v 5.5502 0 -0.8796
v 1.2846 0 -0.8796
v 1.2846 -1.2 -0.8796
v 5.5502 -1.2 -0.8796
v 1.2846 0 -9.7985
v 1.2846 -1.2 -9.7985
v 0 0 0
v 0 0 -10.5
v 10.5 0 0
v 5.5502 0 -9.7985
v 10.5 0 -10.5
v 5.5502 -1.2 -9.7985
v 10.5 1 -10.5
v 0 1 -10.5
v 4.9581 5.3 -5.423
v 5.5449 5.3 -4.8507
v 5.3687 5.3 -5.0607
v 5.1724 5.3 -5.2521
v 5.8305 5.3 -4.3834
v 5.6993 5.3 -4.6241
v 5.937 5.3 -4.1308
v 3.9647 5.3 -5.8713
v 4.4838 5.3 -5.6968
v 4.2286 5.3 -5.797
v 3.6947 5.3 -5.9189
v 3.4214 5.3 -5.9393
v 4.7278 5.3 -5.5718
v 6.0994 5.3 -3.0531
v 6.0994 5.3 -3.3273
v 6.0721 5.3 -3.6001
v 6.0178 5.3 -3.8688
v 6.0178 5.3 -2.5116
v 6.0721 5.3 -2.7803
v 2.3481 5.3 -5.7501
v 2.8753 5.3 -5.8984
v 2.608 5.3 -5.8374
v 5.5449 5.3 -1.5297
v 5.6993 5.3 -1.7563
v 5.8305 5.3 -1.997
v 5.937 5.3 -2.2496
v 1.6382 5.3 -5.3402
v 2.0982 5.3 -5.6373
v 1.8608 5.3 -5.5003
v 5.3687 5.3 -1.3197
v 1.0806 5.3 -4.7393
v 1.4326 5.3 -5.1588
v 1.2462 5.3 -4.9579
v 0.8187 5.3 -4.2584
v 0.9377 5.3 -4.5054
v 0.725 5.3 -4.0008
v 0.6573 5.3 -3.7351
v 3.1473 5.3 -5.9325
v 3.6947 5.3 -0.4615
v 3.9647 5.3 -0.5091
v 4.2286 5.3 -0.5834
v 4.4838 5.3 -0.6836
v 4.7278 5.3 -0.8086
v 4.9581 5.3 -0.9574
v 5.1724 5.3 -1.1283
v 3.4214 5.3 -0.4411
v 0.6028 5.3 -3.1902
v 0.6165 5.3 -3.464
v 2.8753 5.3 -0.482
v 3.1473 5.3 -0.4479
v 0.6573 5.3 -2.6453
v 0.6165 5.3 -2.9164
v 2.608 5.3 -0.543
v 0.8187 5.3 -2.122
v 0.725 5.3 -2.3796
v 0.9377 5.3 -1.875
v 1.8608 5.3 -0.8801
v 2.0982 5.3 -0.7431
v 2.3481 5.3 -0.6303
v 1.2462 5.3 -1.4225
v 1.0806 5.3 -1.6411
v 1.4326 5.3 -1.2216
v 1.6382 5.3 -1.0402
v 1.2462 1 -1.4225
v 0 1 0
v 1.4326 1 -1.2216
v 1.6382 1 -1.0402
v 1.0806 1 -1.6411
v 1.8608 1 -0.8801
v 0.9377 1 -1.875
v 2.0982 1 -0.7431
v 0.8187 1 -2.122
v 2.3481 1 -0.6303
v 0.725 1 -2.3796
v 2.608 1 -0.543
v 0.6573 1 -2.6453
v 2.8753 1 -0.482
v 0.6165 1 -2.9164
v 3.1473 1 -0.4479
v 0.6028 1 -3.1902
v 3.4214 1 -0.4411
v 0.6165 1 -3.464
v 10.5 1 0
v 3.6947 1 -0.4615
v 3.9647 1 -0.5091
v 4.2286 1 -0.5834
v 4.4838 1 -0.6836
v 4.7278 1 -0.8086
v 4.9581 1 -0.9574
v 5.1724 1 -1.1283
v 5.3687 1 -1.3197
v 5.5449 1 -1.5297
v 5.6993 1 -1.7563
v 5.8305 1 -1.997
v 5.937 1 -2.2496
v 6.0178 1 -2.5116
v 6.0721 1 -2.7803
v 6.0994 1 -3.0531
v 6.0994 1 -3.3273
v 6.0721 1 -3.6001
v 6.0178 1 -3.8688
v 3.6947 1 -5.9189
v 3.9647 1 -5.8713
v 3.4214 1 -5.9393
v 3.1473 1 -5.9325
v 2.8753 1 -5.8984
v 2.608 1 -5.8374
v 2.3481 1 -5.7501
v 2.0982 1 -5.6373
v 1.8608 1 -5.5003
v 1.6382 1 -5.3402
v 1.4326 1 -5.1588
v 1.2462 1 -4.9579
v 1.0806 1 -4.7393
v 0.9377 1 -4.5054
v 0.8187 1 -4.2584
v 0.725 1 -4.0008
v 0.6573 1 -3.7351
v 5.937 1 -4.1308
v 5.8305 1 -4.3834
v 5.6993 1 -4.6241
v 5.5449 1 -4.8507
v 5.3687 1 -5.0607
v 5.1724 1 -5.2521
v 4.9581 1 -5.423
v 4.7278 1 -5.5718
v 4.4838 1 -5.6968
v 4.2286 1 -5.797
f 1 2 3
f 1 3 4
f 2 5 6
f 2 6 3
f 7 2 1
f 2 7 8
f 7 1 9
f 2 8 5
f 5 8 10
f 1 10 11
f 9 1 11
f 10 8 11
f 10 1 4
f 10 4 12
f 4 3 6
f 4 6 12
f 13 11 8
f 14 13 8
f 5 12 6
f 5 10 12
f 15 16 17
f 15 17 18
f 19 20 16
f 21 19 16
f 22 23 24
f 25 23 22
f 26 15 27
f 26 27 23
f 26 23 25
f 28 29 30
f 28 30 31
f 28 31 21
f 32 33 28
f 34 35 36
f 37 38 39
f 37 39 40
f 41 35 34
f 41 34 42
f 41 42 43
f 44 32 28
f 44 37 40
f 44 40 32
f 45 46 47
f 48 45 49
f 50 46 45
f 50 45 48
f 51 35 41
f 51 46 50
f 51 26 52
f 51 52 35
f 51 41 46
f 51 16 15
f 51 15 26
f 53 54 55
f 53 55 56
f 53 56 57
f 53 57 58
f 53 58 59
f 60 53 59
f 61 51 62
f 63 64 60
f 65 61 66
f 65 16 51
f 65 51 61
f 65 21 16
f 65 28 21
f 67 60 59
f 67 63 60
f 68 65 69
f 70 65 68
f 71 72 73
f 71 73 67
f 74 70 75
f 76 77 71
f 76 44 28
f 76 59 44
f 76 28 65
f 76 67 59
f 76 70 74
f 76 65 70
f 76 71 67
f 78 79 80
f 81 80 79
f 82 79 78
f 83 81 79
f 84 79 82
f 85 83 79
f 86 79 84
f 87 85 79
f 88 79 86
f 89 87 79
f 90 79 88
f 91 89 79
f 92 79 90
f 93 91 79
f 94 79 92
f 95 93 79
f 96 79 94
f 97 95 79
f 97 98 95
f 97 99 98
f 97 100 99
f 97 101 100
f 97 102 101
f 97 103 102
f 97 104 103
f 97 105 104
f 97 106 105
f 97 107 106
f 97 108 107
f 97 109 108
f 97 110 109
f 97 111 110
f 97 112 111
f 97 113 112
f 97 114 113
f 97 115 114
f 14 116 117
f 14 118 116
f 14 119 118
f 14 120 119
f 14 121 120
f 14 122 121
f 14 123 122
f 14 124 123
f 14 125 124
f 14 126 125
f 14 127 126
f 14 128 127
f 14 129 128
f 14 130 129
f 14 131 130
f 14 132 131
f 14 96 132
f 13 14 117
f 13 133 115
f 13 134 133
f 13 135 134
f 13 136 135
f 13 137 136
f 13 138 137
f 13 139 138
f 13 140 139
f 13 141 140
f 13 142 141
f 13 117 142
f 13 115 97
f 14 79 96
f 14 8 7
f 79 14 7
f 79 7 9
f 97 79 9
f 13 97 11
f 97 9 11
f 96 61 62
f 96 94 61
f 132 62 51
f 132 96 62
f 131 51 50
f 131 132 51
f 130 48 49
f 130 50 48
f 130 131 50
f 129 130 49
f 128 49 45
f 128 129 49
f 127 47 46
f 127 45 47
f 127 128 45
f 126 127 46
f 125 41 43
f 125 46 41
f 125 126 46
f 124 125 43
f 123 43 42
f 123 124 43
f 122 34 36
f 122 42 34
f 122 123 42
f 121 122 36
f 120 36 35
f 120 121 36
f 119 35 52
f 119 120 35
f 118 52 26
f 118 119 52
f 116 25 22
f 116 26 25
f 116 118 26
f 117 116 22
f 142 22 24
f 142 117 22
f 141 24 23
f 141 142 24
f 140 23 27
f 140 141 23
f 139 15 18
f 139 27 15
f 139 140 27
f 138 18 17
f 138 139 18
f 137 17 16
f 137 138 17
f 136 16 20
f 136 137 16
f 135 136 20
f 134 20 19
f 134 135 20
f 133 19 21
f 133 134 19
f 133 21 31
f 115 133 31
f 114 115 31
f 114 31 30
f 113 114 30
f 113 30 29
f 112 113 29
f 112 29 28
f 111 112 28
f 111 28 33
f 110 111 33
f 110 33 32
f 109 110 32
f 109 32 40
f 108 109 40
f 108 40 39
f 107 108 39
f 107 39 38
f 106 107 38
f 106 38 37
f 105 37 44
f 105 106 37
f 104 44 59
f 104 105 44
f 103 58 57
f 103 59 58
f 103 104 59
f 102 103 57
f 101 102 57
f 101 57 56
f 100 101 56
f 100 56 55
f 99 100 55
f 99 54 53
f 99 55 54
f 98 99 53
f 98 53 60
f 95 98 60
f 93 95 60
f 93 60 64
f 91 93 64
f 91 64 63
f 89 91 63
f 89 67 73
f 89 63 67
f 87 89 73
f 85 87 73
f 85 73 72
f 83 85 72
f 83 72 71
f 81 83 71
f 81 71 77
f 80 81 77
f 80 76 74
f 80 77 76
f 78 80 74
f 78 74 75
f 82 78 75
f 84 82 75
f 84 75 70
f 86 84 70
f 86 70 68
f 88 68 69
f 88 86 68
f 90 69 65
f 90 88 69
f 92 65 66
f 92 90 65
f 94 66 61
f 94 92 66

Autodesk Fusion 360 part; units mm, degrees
sketch "Sketch1" plane through (0, 0, 0) normal (0, 1, 0) x (1, 0, 0)
  line L0 (0, 0) -> (10.5, 0)
  line L1 (10.5, 0) -> (10.5, 10.5)
  line L2 (10.5, 10.5) -> (0, 10.5)
  line L3 (0, 10.5) -> (0, 0)
  dimension "d1" = 10.5
  dimension "d2" = 10.5
extrude "Extrude1" add sketch "Sketch1" along normal blind 1
sketch "Sketch2" plane through (0, 1, 0) normal (0, 1, 0) x (-1, 0, 0)
  line L0 (0, -10.5) -> (0, 0)
  line L1 (0, 0) -> (-10.5, 0)
  line L2 (-10.5, 0) -> (-10.5, -10.5)
  line L3 (-10.5, -10.5) -> (0, -10.5)
  circle A0 centre (-3.3528, -3.1902) radius 2.75
  dimension "d5" = 5.5
extrude "Extrude2" add sketch "Sketch2" along normal blind 4.3 contours A0
sketch "Sketch3" plane through (0, 0, 0) normal (0, -1, 0) x (1, 0, 0)
  line L0 (0, 0) -> (0, -10.5)
  line L1 (0, -10.5) -> (10.5, -10.5)
  line L2 (10.5, -10.5) -> (10.5, 0)
  line L3 (10.5, 0) -> (0, 0)
  line L4 (1.2846, -0.8796) -> (5.5502, -0.8796)
  line L5 (5.5502, -0.8796) -> (5.5502, -9.7985)
  line L6 (5.5502, -9.7985) -> (1.2846, -9.7985)
  line L7 (1.2846, -9.7985) -> (1.2846, -0.8796)
extrude "Extrude3" add sketch "Sketch3" along normal blind 1.2 contours L4 L5 L6 L7
